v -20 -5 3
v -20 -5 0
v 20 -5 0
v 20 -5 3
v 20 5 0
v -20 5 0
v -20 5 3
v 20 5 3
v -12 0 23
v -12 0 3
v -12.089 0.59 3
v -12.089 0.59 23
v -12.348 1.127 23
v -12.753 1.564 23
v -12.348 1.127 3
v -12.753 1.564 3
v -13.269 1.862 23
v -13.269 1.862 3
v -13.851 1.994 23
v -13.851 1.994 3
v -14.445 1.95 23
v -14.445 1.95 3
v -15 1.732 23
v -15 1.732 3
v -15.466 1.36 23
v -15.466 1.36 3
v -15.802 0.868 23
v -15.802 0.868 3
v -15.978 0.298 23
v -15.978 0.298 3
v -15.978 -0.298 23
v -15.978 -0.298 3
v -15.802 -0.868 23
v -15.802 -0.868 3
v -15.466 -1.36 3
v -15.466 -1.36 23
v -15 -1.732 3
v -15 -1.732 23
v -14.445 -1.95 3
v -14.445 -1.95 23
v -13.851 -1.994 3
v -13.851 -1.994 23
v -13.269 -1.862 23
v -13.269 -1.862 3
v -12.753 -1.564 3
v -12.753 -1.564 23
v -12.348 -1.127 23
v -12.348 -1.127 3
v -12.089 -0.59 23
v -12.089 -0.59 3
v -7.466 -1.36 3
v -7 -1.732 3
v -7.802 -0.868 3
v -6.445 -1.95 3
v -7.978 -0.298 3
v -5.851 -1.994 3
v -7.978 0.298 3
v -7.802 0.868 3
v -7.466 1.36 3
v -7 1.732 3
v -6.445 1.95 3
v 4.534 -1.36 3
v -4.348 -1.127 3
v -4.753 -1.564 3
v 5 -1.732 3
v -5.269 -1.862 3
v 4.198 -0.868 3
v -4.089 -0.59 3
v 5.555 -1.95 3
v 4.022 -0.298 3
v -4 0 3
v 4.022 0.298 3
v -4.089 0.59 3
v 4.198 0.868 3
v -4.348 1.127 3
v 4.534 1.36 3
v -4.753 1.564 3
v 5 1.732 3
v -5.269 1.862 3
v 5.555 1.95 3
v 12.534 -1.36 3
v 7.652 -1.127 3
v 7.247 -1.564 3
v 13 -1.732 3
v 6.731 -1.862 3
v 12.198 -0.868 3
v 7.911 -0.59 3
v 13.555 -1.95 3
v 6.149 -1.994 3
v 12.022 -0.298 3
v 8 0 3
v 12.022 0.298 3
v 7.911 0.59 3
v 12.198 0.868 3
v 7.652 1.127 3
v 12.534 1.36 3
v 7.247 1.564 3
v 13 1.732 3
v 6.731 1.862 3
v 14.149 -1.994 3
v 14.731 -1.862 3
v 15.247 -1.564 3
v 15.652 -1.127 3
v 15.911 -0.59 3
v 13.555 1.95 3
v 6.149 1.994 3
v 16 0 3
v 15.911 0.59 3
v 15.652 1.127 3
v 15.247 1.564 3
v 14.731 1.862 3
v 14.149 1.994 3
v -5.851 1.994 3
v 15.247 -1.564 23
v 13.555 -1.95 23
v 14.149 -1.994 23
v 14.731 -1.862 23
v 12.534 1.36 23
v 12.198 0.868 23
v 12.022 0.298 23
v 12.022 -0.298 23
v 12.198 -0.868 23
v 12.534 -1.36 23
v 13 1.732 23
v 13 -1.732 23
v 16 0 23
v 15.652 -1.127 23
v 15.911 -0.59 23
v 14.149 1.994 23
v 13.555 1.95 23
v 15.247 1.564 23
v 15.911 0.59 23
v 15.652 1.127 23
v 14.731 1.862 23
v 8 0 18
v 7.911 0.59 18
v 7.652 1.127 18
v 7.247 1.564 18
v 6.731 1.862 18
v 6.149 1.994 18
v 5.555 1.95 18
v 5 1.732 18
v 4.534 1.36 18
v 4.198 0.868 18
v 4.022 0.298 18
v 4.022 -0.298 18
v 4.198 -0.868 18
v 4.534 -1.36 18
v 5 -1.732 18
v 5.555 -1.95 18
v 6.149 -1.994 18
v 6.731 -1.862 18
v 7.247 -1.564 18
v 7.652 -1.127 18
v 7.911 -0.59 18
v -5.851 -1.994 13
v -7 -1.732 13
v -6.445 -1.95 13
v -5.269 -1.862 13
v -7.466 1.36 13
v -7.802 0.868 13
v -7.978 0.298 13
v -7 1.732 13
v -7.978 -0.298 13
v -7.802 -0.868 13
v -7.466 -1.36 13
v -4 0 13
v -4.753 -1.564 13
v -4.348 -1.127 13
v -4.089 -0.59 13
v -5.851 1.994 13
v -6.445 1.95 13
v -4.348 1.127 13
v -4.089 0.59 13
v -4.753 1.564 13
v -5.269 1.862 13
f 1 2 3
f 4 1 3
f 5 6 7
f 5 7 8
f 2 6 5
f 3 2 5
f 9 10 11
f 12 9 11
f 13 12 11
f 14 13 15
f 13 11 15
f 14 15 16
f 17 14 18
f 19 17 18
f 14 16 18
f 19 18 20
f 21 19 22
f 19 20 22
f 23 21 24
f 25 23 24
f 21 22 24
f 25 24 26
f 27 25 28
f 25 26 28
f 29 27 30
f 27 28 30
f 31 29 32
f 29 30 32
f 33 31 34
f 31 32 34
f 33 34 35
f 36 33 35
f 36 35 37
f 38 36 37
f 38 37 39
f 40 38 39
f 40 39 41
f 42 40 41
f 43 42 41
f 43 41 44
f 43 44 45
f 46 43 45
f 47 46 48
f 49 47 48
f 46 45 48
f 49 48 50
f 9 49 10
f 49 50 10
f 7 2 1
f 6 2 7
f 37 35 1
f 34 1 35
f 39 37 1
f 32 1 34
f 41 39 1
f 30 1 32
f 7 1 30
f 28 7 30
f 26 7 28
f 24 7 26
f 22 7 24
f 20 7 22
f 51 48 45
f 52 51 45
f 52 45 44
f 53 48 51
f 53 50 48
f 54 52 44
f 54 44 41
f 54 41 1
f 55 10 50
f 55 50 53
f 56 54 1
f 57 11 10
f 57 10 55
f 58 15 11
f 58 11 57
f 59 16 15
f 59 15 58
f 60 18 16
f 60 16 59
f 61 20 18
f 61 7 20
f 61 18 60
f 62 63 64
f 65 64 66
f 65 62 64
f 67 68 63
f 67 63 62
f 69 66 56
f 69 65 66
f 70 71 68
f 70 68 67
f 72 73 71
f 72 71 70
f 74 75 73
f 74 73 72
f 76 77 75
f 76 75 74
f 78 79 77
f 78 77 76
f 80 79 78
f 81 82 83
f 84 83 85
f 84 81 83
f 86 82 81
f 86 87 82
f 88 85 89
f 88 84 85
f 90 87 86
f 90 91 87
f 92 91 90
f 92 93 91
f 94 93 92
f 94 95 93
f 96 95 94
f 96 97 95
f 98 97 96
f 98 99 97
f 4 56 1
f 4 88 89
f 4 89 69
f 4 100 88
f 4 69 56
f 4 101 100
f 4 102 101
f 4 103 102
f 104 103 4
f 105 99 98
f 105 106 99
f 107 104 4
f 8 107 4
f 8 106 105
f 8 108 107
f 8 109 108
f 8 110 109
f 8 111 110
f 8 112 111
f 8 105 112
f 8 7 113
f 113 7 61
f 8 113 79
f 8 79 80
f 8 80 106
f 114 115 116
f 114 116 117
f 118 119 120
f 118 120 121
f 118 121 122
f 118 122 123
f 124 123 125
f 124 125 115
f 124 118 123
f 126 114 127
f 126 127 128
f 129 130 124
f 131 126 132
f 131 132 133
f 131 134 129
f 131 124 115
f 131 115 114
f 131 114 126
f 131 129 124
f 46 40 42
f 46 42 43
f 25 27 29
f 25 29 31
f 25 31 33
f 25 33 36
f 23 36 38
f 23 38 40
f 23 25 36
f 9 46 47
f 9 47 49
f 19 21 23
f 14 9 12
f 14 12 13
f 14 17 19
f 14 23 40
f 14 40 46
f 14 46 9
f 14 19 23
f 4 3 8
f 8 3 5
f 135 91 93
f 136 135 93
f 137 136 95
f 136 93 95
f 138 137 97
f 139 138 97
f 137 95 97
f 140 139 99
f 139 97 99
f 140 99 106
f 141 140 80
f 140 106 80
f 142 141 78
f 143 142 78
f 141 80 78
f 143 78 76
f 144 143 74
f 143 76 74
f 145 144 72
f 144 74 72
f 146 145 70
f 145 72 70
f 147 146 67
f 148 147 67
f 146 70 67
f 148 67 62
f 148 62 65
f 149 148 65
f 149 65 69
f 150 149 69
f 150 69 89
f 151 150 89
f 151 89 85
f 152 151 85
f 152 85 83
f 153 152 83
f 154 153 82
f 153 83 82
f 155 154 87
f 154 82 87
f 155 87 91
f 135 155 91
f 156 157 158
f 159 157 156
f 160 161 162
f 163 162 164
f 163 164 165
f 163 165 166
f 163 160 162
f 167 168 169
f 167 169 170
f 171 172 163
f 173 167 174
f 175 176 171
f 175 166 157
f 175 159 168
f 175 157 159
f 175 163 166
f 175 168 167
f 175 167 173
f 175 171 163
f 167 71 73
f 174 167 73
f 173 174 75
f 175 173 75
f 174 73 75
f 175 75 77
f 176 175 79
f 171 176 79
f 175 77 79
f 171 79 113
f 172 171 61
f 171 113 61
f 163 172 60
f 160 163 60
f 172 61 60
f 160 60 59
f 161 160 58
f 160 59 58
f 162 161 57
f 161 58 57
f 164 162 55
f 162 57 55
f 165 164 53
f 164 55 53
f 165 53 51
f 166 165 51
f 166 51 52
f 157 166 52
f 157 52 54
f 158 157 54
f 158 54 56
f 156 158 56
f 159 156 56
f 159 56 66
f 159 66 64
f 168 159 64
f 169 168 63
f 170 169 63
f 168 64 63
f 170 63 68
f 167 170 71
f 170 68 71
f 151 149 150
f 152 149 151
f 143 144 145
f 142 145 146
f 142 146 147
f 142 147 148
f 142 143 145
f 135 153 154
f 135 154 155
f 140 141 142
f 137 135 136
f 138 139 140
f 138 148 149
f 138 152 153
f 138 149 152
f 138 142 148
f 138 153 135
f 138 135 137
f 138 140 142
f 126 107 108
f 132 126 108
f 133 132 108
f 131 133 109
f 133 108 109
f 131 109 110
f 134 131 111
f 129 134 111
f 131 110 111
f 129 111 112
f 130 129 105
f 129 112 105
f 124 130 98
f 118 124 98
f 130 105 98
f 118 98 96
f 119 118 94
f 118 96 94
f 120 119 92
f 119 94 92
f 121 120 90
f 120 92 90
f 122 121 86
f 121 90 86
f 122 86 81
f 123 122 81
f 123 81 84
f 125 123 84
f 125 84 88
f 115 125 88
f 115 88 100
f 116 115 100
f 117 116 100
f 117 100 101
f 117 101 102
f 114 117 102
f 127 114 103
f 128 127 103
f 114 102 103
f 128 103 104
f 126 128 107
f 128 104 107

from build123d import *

# Parameters (mm, degrees)
F0_W     = 40
F0_H     = 10
F1_DEPTH = 3
F2_R     = 2
F3_DEPTH = 20
F4_DEPTH = 10
F5_DEPTH = 15


with BuildPart() as f1:
    # F0 (on Top) → F1 (new body)
    with BuildSketch(Plane.XY):
        Rectangle(F0_W, F0_H)
    extrude(amount=F1_DEPTH)

    # F2 (on face) → F3 (join)
    with BuildSketch(Plane.XY.offset(3)):
        with Locations((-14, 0)):
            Circle(F2_R)
        with Locations((14, 0)):
            Circle(F2_R)
    extrude(amount=F3_DEPTH)

    # F2 (on face) → F4 (join)
    with BuildSketch(Plane.XY.offset(3)):
        with Locations((-6, 0)):
            Circle(F2_R)
    extrude(amount=F4_DEPTH)

    # F2 (on face) → F5 (join)
    with BuildSketch(Plane.XY.offset(3)):
        with Locations((6, 0)):
            Circle(F2_R)
    extrude(amount=F5_DEPTH)


solid = f1.part
